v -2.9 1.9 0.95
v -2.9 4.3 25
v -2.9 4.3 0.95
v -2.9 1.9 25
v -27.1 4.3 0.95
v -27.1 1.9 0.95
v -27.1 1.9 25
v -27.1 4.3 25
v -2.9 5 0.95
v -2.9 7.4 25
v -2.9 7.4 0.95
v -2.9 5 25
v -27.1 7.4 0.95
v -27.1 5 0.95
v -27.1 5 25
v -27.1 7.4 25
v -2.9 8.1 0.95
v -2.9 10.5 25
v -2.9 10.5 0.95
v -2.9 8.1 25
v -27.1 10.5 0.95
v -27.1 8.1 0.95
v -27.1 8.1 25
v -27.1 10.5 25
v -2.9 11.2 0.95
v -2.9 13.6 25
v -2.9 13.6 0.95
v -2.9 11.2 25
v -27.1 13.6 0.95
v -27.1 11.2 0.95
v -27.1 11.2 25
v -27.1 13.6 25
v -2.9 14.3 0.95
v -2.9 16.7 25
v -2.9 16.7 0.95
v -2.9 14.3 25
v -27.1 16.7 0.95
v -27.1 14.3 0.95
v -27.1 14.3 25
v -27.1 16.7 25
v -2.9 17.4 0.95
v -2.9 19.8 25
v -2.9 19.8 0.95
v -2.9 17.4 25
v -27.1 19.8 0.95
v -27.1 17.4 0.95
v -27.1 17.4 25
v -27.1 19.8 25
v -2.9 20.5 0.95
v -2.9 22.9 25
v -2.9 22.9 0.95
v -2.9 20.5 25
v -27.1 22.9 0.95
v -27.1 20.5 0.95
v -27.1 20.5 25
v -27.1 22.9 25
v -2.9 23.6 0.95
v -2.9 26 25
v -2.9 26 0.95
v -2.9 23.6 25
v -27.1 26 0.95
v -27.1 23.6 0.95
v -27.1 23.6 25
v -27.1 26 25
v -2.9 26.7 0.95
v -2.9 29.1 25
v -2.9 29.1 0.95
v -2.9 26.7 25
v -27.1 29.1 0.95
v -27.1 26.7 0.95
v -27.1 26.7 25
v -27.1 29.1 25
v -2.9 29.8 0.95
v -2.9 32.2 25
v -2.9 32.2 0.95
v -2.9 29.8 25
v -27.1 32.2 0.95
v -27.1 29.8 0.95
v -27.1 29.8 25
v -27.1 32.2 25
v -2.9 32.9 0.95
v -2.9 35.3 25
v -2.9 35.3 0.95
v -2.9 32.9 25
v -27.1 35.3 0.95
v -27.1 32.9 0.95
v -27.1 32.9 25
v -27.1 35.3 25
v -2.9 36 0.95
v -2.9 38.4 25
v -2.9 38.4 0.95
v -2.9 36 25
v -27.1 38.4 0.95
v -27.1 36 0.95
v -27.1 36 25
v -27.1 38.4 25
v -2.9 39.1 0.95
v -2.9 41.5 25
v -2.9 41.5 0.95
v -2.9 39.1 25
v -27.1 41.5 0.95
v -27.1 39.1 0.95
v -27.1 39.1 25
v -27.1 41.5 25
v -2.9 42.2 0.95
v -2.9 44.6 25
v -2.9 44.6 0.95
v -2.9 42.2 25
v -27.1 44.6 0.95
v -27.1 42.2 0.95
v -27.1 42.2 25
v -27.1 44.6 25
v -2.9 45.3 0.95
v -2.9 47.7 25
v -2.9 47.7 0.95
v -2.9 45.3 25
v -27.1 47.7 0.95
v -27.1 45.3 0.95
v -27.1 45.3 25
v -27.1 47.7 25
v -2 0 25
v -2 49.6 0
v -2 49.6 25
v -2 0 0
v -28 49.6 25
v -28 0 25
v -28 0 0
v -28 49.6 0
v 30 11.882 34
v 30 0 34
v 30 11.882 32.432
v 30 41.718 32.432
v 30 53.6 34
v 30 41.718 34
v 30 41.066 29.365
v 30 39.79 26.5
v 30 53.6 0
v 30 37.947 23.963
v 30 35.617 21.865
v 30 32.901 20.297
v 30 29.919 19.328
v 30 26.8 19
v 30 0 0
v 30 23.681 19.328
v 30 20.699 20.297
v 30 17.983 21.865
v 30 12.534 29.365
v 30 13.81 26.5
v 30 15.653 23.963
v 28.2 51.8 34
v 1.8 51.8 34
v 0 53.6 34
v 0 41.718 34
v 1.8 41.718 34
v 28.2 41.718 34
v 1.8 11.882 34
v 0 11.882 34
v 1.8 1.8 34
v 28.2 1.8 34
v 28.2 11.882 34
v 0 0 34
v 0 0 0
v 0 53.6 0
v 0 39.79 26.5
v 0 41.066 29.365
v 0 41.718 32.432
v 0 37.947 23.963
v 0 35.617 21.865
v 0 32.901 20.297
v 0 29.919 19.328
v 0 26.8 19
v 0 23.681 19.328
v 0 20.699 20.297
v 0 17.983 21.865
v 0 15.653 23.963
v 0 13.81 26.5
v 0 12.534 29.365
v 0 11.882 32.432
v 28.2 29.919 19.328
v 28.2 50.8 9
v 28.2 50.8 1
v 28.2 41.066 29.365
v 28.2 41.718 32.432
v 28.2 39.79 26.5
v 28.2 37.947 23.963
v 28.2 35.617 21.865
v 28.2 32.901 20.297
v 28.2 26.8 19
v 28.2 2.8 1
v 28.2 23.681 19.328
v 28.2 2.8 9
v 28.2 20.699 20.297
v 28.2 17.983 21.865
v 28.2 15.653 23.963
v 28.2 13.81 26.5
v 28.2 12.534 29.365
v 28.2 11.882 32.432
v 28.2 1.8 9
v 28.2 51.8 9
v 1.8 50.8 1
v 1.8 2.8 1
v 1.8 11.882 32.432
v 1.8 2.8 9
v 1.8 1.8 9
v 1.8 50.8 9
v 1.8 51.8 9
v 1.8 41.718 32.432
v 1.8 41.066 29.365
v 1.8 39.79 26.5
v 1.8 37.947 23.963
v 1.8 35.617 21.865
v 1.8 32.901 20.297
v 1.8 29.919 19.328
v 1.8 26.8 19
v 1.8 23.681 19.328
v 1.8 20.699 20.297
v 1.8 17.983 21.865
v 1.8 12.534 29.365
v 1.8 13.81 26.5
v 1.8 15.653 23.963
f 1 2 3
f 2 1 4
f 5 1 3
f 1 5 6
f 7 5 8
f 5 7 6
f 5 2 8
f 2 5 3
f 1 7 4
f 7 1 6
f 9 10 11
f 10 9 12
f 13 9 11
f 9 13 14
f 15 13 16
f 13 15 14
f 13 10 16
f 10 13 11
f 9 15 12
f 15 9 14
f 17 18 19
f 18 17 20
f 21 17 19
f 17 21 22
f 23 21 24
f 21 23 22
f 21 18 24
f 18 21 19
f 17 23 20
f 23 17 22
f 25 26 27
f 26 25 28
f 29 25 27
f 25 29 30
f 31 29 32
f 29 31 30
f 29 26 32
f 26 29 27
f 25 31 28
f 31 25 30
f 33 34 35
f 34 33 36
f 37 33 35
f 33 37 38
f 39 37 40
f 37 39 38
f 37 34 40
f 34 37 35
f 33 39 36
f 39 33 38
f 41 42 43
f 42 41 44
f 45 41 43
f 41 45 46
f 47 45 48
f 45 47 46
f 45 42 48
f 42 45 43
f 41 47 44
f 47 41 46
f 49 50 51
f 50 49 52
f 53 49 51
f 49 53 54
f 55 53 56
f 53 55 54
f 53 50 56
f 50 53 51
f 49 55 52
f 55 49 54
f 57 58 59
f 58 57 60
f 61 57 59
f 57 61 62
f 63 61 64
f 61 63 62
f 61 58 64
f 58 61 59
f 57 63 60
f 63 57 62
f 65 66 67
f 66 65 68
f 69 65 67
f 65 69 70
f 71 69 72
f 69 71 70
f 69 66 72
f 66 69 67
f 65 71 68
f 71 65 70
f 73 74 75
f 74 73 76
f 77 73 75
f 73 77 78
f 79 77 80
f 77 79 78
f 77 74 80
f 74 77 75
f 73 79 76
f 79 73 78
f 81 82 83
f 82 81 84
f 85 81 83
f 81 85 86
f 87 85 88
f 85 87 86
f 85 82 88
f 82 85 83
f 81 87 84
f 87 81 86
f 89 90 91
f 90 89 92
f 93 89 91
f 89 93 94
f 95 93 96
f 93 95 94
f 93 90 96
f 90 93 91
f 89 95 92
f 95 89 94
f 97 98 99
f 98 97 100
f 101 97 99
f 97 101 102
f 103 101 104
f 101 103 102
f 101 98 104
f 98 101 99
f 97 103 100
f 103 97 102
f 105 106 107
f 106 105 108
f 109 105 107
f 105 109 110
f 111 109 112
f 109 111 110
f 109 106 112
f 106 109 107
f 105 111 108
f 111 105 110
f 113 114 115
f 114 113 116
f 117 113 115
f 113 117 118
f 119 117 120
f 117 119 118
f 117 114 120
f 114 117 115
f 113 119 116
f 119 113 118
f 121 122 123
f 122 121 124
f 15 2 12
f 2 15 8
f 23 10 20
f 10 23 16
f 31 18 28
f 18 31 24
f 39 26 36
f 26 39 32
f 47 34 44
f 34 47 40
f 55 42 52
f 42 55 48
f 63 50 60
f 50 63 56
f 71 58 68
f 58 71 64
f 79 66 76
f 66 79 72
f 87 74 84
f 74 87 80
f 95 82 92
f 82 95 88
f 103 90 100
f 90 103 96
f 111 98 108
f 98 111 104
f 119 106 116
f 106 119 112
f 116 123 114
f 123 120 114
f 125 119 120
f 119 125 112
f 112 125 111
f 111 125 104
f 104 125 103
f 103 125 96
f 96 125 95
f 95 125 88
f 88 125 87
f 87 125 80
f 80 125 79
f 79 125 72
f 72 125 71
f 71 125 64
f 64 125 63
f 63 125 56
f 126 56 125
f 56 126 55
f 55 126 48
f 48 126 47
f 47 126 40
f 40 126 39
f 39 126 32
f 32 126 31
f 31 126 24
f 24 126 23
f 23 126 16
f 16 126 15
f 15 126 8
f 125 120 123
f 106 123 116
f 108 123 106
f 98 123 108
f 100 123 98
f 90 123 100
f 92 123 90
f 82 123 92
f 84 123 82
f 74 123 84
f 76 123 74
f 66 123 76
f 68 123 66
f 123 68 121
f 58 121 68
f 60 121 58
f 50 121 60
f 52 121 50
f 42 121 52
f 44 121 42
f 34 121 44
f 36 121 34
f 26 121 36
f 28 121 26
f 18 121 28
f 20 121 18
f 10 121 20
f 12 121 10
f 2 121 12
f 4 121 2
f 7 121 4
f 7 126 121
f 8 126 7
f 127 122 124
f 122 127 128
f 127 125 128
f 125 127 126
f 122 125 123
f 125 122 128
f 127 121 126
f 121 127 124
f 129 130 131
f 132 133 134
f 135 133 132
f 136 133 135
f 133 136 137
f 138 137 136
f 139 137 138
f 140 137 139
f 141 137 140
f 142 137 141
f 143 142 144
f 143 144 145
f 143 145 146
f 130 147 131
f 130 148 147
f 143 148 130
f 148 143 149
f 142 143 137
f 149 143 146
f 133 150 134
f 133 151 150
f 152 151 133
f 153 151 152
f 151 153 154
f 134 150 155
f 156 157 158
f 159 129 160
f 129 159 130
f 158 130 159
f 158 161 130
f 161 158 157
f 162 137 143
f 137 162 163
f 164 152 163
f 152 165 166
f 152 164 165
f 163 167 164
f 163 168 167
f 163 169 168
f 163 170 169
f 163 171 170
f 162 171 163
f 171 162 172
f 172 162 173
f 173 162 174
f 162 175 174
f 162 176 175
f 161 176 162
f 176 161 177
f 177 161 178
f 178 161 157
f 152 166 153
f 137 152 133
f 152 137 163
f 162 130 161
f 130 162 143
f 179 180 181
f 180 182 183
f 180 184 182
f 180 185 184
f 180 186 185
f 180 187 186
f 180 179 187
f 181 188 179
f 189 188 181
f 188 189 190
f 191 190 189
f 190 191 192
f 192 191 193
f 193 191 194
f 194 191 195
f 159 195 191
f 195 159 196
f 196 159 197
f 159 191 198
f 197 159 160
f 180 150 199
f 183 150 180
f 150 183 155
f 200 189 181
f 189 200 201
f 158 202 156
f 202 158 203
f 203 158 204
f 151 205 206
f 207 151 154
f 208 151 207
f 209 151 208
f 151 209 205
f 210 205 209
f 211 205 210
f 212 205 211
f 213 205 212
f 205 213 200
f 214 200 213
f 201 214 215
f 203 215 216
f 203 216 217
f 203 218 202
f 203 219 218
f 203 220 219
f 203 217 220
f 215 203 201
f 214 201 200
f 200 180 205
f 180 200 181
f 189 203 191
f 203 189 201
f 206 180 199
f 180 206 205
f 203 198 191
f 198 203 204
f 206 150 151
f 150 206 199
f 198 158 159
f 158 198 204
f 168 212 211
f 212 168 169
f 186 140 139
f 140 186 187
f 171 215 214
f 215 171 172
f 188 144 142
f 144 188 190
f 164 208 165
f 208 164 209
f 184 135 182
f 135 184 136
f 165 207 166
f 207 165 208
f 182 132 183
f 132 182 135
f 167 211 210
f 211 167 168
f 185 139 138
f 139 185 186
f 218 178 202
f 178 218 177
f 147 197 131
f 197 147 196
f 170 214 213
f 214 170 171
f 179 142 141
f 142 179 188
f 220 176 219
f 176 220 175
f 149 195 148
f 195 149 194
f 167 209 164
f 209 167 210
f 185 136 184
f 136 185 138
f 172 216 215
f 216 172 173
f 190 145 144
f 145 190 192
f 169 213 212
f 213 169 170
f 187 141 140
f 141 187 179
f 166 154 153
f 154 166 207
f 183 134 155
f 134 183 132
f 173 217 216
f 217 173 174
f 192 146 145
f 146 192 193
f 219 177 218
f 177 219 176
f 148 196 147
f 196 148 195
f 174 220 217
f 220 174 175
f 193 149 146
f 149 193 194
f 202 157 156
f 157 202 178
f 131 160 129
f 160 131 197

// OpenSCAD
//===========================================================================
//
// SD card holder
//
// Minimalist case for SD card storage.
//
// This part was designed 24 Feburary 2019 by Joe McKeown. 
// It's available under the terms of the Creative Commons CC-BY license 
// (https://creativecommons.org/licenses/by/3.0/).
// 
// History:
// V1.0 24 Fev 2019 First version
//===========================================================================

// Number of cards to hold
num=15;
// tolerance between parts (increase if too tight)
margin = 0.2; // [0.1:0.1:1.0]

/* [Hidden] */
pitch=2.9+margin;

boxX=26;
boxY=(num+1)*pitch;

module SDBlank(pos=[0,0,0], orientation=[0,0,0], margin=0){
  translate(pos) translate([0,0,(32+margin)/2]) rotate(orientation)
  cube([24+margin, 2.2+margin, 32.1+margin],true);
}


module box(){
  difference(){
    translate([0,boxY/2,12.5])
      cube([26, boxY, 25],true);
    for( y = [pitch:pitch:pitch*num+0.1] )
      SDBlank(pos=[0,y,1], margin=margin);
  }
}

module lid(){
  translate([0,(boxY+4)/2,0])
  difference(){
    translate([0,0,17])
      cube([boxX+4, boxY+4, 34],true);
    translate([0,0,21])
      cube([boxX+margin*2, boxY-2+margin*2, 40],true);
    translate([0,0,29])
      cube([boxX+margin*2, boxY+margin*2, 40],true);
    translate([0,0,34])
      rotate([0,90,0])
        cylinder(d=30, h=boxX*2, center=true);
  }
}


sep= boxX/2+2;
translate([-sep,0,0])
box();

translate([ sep,0,0])
lid();
